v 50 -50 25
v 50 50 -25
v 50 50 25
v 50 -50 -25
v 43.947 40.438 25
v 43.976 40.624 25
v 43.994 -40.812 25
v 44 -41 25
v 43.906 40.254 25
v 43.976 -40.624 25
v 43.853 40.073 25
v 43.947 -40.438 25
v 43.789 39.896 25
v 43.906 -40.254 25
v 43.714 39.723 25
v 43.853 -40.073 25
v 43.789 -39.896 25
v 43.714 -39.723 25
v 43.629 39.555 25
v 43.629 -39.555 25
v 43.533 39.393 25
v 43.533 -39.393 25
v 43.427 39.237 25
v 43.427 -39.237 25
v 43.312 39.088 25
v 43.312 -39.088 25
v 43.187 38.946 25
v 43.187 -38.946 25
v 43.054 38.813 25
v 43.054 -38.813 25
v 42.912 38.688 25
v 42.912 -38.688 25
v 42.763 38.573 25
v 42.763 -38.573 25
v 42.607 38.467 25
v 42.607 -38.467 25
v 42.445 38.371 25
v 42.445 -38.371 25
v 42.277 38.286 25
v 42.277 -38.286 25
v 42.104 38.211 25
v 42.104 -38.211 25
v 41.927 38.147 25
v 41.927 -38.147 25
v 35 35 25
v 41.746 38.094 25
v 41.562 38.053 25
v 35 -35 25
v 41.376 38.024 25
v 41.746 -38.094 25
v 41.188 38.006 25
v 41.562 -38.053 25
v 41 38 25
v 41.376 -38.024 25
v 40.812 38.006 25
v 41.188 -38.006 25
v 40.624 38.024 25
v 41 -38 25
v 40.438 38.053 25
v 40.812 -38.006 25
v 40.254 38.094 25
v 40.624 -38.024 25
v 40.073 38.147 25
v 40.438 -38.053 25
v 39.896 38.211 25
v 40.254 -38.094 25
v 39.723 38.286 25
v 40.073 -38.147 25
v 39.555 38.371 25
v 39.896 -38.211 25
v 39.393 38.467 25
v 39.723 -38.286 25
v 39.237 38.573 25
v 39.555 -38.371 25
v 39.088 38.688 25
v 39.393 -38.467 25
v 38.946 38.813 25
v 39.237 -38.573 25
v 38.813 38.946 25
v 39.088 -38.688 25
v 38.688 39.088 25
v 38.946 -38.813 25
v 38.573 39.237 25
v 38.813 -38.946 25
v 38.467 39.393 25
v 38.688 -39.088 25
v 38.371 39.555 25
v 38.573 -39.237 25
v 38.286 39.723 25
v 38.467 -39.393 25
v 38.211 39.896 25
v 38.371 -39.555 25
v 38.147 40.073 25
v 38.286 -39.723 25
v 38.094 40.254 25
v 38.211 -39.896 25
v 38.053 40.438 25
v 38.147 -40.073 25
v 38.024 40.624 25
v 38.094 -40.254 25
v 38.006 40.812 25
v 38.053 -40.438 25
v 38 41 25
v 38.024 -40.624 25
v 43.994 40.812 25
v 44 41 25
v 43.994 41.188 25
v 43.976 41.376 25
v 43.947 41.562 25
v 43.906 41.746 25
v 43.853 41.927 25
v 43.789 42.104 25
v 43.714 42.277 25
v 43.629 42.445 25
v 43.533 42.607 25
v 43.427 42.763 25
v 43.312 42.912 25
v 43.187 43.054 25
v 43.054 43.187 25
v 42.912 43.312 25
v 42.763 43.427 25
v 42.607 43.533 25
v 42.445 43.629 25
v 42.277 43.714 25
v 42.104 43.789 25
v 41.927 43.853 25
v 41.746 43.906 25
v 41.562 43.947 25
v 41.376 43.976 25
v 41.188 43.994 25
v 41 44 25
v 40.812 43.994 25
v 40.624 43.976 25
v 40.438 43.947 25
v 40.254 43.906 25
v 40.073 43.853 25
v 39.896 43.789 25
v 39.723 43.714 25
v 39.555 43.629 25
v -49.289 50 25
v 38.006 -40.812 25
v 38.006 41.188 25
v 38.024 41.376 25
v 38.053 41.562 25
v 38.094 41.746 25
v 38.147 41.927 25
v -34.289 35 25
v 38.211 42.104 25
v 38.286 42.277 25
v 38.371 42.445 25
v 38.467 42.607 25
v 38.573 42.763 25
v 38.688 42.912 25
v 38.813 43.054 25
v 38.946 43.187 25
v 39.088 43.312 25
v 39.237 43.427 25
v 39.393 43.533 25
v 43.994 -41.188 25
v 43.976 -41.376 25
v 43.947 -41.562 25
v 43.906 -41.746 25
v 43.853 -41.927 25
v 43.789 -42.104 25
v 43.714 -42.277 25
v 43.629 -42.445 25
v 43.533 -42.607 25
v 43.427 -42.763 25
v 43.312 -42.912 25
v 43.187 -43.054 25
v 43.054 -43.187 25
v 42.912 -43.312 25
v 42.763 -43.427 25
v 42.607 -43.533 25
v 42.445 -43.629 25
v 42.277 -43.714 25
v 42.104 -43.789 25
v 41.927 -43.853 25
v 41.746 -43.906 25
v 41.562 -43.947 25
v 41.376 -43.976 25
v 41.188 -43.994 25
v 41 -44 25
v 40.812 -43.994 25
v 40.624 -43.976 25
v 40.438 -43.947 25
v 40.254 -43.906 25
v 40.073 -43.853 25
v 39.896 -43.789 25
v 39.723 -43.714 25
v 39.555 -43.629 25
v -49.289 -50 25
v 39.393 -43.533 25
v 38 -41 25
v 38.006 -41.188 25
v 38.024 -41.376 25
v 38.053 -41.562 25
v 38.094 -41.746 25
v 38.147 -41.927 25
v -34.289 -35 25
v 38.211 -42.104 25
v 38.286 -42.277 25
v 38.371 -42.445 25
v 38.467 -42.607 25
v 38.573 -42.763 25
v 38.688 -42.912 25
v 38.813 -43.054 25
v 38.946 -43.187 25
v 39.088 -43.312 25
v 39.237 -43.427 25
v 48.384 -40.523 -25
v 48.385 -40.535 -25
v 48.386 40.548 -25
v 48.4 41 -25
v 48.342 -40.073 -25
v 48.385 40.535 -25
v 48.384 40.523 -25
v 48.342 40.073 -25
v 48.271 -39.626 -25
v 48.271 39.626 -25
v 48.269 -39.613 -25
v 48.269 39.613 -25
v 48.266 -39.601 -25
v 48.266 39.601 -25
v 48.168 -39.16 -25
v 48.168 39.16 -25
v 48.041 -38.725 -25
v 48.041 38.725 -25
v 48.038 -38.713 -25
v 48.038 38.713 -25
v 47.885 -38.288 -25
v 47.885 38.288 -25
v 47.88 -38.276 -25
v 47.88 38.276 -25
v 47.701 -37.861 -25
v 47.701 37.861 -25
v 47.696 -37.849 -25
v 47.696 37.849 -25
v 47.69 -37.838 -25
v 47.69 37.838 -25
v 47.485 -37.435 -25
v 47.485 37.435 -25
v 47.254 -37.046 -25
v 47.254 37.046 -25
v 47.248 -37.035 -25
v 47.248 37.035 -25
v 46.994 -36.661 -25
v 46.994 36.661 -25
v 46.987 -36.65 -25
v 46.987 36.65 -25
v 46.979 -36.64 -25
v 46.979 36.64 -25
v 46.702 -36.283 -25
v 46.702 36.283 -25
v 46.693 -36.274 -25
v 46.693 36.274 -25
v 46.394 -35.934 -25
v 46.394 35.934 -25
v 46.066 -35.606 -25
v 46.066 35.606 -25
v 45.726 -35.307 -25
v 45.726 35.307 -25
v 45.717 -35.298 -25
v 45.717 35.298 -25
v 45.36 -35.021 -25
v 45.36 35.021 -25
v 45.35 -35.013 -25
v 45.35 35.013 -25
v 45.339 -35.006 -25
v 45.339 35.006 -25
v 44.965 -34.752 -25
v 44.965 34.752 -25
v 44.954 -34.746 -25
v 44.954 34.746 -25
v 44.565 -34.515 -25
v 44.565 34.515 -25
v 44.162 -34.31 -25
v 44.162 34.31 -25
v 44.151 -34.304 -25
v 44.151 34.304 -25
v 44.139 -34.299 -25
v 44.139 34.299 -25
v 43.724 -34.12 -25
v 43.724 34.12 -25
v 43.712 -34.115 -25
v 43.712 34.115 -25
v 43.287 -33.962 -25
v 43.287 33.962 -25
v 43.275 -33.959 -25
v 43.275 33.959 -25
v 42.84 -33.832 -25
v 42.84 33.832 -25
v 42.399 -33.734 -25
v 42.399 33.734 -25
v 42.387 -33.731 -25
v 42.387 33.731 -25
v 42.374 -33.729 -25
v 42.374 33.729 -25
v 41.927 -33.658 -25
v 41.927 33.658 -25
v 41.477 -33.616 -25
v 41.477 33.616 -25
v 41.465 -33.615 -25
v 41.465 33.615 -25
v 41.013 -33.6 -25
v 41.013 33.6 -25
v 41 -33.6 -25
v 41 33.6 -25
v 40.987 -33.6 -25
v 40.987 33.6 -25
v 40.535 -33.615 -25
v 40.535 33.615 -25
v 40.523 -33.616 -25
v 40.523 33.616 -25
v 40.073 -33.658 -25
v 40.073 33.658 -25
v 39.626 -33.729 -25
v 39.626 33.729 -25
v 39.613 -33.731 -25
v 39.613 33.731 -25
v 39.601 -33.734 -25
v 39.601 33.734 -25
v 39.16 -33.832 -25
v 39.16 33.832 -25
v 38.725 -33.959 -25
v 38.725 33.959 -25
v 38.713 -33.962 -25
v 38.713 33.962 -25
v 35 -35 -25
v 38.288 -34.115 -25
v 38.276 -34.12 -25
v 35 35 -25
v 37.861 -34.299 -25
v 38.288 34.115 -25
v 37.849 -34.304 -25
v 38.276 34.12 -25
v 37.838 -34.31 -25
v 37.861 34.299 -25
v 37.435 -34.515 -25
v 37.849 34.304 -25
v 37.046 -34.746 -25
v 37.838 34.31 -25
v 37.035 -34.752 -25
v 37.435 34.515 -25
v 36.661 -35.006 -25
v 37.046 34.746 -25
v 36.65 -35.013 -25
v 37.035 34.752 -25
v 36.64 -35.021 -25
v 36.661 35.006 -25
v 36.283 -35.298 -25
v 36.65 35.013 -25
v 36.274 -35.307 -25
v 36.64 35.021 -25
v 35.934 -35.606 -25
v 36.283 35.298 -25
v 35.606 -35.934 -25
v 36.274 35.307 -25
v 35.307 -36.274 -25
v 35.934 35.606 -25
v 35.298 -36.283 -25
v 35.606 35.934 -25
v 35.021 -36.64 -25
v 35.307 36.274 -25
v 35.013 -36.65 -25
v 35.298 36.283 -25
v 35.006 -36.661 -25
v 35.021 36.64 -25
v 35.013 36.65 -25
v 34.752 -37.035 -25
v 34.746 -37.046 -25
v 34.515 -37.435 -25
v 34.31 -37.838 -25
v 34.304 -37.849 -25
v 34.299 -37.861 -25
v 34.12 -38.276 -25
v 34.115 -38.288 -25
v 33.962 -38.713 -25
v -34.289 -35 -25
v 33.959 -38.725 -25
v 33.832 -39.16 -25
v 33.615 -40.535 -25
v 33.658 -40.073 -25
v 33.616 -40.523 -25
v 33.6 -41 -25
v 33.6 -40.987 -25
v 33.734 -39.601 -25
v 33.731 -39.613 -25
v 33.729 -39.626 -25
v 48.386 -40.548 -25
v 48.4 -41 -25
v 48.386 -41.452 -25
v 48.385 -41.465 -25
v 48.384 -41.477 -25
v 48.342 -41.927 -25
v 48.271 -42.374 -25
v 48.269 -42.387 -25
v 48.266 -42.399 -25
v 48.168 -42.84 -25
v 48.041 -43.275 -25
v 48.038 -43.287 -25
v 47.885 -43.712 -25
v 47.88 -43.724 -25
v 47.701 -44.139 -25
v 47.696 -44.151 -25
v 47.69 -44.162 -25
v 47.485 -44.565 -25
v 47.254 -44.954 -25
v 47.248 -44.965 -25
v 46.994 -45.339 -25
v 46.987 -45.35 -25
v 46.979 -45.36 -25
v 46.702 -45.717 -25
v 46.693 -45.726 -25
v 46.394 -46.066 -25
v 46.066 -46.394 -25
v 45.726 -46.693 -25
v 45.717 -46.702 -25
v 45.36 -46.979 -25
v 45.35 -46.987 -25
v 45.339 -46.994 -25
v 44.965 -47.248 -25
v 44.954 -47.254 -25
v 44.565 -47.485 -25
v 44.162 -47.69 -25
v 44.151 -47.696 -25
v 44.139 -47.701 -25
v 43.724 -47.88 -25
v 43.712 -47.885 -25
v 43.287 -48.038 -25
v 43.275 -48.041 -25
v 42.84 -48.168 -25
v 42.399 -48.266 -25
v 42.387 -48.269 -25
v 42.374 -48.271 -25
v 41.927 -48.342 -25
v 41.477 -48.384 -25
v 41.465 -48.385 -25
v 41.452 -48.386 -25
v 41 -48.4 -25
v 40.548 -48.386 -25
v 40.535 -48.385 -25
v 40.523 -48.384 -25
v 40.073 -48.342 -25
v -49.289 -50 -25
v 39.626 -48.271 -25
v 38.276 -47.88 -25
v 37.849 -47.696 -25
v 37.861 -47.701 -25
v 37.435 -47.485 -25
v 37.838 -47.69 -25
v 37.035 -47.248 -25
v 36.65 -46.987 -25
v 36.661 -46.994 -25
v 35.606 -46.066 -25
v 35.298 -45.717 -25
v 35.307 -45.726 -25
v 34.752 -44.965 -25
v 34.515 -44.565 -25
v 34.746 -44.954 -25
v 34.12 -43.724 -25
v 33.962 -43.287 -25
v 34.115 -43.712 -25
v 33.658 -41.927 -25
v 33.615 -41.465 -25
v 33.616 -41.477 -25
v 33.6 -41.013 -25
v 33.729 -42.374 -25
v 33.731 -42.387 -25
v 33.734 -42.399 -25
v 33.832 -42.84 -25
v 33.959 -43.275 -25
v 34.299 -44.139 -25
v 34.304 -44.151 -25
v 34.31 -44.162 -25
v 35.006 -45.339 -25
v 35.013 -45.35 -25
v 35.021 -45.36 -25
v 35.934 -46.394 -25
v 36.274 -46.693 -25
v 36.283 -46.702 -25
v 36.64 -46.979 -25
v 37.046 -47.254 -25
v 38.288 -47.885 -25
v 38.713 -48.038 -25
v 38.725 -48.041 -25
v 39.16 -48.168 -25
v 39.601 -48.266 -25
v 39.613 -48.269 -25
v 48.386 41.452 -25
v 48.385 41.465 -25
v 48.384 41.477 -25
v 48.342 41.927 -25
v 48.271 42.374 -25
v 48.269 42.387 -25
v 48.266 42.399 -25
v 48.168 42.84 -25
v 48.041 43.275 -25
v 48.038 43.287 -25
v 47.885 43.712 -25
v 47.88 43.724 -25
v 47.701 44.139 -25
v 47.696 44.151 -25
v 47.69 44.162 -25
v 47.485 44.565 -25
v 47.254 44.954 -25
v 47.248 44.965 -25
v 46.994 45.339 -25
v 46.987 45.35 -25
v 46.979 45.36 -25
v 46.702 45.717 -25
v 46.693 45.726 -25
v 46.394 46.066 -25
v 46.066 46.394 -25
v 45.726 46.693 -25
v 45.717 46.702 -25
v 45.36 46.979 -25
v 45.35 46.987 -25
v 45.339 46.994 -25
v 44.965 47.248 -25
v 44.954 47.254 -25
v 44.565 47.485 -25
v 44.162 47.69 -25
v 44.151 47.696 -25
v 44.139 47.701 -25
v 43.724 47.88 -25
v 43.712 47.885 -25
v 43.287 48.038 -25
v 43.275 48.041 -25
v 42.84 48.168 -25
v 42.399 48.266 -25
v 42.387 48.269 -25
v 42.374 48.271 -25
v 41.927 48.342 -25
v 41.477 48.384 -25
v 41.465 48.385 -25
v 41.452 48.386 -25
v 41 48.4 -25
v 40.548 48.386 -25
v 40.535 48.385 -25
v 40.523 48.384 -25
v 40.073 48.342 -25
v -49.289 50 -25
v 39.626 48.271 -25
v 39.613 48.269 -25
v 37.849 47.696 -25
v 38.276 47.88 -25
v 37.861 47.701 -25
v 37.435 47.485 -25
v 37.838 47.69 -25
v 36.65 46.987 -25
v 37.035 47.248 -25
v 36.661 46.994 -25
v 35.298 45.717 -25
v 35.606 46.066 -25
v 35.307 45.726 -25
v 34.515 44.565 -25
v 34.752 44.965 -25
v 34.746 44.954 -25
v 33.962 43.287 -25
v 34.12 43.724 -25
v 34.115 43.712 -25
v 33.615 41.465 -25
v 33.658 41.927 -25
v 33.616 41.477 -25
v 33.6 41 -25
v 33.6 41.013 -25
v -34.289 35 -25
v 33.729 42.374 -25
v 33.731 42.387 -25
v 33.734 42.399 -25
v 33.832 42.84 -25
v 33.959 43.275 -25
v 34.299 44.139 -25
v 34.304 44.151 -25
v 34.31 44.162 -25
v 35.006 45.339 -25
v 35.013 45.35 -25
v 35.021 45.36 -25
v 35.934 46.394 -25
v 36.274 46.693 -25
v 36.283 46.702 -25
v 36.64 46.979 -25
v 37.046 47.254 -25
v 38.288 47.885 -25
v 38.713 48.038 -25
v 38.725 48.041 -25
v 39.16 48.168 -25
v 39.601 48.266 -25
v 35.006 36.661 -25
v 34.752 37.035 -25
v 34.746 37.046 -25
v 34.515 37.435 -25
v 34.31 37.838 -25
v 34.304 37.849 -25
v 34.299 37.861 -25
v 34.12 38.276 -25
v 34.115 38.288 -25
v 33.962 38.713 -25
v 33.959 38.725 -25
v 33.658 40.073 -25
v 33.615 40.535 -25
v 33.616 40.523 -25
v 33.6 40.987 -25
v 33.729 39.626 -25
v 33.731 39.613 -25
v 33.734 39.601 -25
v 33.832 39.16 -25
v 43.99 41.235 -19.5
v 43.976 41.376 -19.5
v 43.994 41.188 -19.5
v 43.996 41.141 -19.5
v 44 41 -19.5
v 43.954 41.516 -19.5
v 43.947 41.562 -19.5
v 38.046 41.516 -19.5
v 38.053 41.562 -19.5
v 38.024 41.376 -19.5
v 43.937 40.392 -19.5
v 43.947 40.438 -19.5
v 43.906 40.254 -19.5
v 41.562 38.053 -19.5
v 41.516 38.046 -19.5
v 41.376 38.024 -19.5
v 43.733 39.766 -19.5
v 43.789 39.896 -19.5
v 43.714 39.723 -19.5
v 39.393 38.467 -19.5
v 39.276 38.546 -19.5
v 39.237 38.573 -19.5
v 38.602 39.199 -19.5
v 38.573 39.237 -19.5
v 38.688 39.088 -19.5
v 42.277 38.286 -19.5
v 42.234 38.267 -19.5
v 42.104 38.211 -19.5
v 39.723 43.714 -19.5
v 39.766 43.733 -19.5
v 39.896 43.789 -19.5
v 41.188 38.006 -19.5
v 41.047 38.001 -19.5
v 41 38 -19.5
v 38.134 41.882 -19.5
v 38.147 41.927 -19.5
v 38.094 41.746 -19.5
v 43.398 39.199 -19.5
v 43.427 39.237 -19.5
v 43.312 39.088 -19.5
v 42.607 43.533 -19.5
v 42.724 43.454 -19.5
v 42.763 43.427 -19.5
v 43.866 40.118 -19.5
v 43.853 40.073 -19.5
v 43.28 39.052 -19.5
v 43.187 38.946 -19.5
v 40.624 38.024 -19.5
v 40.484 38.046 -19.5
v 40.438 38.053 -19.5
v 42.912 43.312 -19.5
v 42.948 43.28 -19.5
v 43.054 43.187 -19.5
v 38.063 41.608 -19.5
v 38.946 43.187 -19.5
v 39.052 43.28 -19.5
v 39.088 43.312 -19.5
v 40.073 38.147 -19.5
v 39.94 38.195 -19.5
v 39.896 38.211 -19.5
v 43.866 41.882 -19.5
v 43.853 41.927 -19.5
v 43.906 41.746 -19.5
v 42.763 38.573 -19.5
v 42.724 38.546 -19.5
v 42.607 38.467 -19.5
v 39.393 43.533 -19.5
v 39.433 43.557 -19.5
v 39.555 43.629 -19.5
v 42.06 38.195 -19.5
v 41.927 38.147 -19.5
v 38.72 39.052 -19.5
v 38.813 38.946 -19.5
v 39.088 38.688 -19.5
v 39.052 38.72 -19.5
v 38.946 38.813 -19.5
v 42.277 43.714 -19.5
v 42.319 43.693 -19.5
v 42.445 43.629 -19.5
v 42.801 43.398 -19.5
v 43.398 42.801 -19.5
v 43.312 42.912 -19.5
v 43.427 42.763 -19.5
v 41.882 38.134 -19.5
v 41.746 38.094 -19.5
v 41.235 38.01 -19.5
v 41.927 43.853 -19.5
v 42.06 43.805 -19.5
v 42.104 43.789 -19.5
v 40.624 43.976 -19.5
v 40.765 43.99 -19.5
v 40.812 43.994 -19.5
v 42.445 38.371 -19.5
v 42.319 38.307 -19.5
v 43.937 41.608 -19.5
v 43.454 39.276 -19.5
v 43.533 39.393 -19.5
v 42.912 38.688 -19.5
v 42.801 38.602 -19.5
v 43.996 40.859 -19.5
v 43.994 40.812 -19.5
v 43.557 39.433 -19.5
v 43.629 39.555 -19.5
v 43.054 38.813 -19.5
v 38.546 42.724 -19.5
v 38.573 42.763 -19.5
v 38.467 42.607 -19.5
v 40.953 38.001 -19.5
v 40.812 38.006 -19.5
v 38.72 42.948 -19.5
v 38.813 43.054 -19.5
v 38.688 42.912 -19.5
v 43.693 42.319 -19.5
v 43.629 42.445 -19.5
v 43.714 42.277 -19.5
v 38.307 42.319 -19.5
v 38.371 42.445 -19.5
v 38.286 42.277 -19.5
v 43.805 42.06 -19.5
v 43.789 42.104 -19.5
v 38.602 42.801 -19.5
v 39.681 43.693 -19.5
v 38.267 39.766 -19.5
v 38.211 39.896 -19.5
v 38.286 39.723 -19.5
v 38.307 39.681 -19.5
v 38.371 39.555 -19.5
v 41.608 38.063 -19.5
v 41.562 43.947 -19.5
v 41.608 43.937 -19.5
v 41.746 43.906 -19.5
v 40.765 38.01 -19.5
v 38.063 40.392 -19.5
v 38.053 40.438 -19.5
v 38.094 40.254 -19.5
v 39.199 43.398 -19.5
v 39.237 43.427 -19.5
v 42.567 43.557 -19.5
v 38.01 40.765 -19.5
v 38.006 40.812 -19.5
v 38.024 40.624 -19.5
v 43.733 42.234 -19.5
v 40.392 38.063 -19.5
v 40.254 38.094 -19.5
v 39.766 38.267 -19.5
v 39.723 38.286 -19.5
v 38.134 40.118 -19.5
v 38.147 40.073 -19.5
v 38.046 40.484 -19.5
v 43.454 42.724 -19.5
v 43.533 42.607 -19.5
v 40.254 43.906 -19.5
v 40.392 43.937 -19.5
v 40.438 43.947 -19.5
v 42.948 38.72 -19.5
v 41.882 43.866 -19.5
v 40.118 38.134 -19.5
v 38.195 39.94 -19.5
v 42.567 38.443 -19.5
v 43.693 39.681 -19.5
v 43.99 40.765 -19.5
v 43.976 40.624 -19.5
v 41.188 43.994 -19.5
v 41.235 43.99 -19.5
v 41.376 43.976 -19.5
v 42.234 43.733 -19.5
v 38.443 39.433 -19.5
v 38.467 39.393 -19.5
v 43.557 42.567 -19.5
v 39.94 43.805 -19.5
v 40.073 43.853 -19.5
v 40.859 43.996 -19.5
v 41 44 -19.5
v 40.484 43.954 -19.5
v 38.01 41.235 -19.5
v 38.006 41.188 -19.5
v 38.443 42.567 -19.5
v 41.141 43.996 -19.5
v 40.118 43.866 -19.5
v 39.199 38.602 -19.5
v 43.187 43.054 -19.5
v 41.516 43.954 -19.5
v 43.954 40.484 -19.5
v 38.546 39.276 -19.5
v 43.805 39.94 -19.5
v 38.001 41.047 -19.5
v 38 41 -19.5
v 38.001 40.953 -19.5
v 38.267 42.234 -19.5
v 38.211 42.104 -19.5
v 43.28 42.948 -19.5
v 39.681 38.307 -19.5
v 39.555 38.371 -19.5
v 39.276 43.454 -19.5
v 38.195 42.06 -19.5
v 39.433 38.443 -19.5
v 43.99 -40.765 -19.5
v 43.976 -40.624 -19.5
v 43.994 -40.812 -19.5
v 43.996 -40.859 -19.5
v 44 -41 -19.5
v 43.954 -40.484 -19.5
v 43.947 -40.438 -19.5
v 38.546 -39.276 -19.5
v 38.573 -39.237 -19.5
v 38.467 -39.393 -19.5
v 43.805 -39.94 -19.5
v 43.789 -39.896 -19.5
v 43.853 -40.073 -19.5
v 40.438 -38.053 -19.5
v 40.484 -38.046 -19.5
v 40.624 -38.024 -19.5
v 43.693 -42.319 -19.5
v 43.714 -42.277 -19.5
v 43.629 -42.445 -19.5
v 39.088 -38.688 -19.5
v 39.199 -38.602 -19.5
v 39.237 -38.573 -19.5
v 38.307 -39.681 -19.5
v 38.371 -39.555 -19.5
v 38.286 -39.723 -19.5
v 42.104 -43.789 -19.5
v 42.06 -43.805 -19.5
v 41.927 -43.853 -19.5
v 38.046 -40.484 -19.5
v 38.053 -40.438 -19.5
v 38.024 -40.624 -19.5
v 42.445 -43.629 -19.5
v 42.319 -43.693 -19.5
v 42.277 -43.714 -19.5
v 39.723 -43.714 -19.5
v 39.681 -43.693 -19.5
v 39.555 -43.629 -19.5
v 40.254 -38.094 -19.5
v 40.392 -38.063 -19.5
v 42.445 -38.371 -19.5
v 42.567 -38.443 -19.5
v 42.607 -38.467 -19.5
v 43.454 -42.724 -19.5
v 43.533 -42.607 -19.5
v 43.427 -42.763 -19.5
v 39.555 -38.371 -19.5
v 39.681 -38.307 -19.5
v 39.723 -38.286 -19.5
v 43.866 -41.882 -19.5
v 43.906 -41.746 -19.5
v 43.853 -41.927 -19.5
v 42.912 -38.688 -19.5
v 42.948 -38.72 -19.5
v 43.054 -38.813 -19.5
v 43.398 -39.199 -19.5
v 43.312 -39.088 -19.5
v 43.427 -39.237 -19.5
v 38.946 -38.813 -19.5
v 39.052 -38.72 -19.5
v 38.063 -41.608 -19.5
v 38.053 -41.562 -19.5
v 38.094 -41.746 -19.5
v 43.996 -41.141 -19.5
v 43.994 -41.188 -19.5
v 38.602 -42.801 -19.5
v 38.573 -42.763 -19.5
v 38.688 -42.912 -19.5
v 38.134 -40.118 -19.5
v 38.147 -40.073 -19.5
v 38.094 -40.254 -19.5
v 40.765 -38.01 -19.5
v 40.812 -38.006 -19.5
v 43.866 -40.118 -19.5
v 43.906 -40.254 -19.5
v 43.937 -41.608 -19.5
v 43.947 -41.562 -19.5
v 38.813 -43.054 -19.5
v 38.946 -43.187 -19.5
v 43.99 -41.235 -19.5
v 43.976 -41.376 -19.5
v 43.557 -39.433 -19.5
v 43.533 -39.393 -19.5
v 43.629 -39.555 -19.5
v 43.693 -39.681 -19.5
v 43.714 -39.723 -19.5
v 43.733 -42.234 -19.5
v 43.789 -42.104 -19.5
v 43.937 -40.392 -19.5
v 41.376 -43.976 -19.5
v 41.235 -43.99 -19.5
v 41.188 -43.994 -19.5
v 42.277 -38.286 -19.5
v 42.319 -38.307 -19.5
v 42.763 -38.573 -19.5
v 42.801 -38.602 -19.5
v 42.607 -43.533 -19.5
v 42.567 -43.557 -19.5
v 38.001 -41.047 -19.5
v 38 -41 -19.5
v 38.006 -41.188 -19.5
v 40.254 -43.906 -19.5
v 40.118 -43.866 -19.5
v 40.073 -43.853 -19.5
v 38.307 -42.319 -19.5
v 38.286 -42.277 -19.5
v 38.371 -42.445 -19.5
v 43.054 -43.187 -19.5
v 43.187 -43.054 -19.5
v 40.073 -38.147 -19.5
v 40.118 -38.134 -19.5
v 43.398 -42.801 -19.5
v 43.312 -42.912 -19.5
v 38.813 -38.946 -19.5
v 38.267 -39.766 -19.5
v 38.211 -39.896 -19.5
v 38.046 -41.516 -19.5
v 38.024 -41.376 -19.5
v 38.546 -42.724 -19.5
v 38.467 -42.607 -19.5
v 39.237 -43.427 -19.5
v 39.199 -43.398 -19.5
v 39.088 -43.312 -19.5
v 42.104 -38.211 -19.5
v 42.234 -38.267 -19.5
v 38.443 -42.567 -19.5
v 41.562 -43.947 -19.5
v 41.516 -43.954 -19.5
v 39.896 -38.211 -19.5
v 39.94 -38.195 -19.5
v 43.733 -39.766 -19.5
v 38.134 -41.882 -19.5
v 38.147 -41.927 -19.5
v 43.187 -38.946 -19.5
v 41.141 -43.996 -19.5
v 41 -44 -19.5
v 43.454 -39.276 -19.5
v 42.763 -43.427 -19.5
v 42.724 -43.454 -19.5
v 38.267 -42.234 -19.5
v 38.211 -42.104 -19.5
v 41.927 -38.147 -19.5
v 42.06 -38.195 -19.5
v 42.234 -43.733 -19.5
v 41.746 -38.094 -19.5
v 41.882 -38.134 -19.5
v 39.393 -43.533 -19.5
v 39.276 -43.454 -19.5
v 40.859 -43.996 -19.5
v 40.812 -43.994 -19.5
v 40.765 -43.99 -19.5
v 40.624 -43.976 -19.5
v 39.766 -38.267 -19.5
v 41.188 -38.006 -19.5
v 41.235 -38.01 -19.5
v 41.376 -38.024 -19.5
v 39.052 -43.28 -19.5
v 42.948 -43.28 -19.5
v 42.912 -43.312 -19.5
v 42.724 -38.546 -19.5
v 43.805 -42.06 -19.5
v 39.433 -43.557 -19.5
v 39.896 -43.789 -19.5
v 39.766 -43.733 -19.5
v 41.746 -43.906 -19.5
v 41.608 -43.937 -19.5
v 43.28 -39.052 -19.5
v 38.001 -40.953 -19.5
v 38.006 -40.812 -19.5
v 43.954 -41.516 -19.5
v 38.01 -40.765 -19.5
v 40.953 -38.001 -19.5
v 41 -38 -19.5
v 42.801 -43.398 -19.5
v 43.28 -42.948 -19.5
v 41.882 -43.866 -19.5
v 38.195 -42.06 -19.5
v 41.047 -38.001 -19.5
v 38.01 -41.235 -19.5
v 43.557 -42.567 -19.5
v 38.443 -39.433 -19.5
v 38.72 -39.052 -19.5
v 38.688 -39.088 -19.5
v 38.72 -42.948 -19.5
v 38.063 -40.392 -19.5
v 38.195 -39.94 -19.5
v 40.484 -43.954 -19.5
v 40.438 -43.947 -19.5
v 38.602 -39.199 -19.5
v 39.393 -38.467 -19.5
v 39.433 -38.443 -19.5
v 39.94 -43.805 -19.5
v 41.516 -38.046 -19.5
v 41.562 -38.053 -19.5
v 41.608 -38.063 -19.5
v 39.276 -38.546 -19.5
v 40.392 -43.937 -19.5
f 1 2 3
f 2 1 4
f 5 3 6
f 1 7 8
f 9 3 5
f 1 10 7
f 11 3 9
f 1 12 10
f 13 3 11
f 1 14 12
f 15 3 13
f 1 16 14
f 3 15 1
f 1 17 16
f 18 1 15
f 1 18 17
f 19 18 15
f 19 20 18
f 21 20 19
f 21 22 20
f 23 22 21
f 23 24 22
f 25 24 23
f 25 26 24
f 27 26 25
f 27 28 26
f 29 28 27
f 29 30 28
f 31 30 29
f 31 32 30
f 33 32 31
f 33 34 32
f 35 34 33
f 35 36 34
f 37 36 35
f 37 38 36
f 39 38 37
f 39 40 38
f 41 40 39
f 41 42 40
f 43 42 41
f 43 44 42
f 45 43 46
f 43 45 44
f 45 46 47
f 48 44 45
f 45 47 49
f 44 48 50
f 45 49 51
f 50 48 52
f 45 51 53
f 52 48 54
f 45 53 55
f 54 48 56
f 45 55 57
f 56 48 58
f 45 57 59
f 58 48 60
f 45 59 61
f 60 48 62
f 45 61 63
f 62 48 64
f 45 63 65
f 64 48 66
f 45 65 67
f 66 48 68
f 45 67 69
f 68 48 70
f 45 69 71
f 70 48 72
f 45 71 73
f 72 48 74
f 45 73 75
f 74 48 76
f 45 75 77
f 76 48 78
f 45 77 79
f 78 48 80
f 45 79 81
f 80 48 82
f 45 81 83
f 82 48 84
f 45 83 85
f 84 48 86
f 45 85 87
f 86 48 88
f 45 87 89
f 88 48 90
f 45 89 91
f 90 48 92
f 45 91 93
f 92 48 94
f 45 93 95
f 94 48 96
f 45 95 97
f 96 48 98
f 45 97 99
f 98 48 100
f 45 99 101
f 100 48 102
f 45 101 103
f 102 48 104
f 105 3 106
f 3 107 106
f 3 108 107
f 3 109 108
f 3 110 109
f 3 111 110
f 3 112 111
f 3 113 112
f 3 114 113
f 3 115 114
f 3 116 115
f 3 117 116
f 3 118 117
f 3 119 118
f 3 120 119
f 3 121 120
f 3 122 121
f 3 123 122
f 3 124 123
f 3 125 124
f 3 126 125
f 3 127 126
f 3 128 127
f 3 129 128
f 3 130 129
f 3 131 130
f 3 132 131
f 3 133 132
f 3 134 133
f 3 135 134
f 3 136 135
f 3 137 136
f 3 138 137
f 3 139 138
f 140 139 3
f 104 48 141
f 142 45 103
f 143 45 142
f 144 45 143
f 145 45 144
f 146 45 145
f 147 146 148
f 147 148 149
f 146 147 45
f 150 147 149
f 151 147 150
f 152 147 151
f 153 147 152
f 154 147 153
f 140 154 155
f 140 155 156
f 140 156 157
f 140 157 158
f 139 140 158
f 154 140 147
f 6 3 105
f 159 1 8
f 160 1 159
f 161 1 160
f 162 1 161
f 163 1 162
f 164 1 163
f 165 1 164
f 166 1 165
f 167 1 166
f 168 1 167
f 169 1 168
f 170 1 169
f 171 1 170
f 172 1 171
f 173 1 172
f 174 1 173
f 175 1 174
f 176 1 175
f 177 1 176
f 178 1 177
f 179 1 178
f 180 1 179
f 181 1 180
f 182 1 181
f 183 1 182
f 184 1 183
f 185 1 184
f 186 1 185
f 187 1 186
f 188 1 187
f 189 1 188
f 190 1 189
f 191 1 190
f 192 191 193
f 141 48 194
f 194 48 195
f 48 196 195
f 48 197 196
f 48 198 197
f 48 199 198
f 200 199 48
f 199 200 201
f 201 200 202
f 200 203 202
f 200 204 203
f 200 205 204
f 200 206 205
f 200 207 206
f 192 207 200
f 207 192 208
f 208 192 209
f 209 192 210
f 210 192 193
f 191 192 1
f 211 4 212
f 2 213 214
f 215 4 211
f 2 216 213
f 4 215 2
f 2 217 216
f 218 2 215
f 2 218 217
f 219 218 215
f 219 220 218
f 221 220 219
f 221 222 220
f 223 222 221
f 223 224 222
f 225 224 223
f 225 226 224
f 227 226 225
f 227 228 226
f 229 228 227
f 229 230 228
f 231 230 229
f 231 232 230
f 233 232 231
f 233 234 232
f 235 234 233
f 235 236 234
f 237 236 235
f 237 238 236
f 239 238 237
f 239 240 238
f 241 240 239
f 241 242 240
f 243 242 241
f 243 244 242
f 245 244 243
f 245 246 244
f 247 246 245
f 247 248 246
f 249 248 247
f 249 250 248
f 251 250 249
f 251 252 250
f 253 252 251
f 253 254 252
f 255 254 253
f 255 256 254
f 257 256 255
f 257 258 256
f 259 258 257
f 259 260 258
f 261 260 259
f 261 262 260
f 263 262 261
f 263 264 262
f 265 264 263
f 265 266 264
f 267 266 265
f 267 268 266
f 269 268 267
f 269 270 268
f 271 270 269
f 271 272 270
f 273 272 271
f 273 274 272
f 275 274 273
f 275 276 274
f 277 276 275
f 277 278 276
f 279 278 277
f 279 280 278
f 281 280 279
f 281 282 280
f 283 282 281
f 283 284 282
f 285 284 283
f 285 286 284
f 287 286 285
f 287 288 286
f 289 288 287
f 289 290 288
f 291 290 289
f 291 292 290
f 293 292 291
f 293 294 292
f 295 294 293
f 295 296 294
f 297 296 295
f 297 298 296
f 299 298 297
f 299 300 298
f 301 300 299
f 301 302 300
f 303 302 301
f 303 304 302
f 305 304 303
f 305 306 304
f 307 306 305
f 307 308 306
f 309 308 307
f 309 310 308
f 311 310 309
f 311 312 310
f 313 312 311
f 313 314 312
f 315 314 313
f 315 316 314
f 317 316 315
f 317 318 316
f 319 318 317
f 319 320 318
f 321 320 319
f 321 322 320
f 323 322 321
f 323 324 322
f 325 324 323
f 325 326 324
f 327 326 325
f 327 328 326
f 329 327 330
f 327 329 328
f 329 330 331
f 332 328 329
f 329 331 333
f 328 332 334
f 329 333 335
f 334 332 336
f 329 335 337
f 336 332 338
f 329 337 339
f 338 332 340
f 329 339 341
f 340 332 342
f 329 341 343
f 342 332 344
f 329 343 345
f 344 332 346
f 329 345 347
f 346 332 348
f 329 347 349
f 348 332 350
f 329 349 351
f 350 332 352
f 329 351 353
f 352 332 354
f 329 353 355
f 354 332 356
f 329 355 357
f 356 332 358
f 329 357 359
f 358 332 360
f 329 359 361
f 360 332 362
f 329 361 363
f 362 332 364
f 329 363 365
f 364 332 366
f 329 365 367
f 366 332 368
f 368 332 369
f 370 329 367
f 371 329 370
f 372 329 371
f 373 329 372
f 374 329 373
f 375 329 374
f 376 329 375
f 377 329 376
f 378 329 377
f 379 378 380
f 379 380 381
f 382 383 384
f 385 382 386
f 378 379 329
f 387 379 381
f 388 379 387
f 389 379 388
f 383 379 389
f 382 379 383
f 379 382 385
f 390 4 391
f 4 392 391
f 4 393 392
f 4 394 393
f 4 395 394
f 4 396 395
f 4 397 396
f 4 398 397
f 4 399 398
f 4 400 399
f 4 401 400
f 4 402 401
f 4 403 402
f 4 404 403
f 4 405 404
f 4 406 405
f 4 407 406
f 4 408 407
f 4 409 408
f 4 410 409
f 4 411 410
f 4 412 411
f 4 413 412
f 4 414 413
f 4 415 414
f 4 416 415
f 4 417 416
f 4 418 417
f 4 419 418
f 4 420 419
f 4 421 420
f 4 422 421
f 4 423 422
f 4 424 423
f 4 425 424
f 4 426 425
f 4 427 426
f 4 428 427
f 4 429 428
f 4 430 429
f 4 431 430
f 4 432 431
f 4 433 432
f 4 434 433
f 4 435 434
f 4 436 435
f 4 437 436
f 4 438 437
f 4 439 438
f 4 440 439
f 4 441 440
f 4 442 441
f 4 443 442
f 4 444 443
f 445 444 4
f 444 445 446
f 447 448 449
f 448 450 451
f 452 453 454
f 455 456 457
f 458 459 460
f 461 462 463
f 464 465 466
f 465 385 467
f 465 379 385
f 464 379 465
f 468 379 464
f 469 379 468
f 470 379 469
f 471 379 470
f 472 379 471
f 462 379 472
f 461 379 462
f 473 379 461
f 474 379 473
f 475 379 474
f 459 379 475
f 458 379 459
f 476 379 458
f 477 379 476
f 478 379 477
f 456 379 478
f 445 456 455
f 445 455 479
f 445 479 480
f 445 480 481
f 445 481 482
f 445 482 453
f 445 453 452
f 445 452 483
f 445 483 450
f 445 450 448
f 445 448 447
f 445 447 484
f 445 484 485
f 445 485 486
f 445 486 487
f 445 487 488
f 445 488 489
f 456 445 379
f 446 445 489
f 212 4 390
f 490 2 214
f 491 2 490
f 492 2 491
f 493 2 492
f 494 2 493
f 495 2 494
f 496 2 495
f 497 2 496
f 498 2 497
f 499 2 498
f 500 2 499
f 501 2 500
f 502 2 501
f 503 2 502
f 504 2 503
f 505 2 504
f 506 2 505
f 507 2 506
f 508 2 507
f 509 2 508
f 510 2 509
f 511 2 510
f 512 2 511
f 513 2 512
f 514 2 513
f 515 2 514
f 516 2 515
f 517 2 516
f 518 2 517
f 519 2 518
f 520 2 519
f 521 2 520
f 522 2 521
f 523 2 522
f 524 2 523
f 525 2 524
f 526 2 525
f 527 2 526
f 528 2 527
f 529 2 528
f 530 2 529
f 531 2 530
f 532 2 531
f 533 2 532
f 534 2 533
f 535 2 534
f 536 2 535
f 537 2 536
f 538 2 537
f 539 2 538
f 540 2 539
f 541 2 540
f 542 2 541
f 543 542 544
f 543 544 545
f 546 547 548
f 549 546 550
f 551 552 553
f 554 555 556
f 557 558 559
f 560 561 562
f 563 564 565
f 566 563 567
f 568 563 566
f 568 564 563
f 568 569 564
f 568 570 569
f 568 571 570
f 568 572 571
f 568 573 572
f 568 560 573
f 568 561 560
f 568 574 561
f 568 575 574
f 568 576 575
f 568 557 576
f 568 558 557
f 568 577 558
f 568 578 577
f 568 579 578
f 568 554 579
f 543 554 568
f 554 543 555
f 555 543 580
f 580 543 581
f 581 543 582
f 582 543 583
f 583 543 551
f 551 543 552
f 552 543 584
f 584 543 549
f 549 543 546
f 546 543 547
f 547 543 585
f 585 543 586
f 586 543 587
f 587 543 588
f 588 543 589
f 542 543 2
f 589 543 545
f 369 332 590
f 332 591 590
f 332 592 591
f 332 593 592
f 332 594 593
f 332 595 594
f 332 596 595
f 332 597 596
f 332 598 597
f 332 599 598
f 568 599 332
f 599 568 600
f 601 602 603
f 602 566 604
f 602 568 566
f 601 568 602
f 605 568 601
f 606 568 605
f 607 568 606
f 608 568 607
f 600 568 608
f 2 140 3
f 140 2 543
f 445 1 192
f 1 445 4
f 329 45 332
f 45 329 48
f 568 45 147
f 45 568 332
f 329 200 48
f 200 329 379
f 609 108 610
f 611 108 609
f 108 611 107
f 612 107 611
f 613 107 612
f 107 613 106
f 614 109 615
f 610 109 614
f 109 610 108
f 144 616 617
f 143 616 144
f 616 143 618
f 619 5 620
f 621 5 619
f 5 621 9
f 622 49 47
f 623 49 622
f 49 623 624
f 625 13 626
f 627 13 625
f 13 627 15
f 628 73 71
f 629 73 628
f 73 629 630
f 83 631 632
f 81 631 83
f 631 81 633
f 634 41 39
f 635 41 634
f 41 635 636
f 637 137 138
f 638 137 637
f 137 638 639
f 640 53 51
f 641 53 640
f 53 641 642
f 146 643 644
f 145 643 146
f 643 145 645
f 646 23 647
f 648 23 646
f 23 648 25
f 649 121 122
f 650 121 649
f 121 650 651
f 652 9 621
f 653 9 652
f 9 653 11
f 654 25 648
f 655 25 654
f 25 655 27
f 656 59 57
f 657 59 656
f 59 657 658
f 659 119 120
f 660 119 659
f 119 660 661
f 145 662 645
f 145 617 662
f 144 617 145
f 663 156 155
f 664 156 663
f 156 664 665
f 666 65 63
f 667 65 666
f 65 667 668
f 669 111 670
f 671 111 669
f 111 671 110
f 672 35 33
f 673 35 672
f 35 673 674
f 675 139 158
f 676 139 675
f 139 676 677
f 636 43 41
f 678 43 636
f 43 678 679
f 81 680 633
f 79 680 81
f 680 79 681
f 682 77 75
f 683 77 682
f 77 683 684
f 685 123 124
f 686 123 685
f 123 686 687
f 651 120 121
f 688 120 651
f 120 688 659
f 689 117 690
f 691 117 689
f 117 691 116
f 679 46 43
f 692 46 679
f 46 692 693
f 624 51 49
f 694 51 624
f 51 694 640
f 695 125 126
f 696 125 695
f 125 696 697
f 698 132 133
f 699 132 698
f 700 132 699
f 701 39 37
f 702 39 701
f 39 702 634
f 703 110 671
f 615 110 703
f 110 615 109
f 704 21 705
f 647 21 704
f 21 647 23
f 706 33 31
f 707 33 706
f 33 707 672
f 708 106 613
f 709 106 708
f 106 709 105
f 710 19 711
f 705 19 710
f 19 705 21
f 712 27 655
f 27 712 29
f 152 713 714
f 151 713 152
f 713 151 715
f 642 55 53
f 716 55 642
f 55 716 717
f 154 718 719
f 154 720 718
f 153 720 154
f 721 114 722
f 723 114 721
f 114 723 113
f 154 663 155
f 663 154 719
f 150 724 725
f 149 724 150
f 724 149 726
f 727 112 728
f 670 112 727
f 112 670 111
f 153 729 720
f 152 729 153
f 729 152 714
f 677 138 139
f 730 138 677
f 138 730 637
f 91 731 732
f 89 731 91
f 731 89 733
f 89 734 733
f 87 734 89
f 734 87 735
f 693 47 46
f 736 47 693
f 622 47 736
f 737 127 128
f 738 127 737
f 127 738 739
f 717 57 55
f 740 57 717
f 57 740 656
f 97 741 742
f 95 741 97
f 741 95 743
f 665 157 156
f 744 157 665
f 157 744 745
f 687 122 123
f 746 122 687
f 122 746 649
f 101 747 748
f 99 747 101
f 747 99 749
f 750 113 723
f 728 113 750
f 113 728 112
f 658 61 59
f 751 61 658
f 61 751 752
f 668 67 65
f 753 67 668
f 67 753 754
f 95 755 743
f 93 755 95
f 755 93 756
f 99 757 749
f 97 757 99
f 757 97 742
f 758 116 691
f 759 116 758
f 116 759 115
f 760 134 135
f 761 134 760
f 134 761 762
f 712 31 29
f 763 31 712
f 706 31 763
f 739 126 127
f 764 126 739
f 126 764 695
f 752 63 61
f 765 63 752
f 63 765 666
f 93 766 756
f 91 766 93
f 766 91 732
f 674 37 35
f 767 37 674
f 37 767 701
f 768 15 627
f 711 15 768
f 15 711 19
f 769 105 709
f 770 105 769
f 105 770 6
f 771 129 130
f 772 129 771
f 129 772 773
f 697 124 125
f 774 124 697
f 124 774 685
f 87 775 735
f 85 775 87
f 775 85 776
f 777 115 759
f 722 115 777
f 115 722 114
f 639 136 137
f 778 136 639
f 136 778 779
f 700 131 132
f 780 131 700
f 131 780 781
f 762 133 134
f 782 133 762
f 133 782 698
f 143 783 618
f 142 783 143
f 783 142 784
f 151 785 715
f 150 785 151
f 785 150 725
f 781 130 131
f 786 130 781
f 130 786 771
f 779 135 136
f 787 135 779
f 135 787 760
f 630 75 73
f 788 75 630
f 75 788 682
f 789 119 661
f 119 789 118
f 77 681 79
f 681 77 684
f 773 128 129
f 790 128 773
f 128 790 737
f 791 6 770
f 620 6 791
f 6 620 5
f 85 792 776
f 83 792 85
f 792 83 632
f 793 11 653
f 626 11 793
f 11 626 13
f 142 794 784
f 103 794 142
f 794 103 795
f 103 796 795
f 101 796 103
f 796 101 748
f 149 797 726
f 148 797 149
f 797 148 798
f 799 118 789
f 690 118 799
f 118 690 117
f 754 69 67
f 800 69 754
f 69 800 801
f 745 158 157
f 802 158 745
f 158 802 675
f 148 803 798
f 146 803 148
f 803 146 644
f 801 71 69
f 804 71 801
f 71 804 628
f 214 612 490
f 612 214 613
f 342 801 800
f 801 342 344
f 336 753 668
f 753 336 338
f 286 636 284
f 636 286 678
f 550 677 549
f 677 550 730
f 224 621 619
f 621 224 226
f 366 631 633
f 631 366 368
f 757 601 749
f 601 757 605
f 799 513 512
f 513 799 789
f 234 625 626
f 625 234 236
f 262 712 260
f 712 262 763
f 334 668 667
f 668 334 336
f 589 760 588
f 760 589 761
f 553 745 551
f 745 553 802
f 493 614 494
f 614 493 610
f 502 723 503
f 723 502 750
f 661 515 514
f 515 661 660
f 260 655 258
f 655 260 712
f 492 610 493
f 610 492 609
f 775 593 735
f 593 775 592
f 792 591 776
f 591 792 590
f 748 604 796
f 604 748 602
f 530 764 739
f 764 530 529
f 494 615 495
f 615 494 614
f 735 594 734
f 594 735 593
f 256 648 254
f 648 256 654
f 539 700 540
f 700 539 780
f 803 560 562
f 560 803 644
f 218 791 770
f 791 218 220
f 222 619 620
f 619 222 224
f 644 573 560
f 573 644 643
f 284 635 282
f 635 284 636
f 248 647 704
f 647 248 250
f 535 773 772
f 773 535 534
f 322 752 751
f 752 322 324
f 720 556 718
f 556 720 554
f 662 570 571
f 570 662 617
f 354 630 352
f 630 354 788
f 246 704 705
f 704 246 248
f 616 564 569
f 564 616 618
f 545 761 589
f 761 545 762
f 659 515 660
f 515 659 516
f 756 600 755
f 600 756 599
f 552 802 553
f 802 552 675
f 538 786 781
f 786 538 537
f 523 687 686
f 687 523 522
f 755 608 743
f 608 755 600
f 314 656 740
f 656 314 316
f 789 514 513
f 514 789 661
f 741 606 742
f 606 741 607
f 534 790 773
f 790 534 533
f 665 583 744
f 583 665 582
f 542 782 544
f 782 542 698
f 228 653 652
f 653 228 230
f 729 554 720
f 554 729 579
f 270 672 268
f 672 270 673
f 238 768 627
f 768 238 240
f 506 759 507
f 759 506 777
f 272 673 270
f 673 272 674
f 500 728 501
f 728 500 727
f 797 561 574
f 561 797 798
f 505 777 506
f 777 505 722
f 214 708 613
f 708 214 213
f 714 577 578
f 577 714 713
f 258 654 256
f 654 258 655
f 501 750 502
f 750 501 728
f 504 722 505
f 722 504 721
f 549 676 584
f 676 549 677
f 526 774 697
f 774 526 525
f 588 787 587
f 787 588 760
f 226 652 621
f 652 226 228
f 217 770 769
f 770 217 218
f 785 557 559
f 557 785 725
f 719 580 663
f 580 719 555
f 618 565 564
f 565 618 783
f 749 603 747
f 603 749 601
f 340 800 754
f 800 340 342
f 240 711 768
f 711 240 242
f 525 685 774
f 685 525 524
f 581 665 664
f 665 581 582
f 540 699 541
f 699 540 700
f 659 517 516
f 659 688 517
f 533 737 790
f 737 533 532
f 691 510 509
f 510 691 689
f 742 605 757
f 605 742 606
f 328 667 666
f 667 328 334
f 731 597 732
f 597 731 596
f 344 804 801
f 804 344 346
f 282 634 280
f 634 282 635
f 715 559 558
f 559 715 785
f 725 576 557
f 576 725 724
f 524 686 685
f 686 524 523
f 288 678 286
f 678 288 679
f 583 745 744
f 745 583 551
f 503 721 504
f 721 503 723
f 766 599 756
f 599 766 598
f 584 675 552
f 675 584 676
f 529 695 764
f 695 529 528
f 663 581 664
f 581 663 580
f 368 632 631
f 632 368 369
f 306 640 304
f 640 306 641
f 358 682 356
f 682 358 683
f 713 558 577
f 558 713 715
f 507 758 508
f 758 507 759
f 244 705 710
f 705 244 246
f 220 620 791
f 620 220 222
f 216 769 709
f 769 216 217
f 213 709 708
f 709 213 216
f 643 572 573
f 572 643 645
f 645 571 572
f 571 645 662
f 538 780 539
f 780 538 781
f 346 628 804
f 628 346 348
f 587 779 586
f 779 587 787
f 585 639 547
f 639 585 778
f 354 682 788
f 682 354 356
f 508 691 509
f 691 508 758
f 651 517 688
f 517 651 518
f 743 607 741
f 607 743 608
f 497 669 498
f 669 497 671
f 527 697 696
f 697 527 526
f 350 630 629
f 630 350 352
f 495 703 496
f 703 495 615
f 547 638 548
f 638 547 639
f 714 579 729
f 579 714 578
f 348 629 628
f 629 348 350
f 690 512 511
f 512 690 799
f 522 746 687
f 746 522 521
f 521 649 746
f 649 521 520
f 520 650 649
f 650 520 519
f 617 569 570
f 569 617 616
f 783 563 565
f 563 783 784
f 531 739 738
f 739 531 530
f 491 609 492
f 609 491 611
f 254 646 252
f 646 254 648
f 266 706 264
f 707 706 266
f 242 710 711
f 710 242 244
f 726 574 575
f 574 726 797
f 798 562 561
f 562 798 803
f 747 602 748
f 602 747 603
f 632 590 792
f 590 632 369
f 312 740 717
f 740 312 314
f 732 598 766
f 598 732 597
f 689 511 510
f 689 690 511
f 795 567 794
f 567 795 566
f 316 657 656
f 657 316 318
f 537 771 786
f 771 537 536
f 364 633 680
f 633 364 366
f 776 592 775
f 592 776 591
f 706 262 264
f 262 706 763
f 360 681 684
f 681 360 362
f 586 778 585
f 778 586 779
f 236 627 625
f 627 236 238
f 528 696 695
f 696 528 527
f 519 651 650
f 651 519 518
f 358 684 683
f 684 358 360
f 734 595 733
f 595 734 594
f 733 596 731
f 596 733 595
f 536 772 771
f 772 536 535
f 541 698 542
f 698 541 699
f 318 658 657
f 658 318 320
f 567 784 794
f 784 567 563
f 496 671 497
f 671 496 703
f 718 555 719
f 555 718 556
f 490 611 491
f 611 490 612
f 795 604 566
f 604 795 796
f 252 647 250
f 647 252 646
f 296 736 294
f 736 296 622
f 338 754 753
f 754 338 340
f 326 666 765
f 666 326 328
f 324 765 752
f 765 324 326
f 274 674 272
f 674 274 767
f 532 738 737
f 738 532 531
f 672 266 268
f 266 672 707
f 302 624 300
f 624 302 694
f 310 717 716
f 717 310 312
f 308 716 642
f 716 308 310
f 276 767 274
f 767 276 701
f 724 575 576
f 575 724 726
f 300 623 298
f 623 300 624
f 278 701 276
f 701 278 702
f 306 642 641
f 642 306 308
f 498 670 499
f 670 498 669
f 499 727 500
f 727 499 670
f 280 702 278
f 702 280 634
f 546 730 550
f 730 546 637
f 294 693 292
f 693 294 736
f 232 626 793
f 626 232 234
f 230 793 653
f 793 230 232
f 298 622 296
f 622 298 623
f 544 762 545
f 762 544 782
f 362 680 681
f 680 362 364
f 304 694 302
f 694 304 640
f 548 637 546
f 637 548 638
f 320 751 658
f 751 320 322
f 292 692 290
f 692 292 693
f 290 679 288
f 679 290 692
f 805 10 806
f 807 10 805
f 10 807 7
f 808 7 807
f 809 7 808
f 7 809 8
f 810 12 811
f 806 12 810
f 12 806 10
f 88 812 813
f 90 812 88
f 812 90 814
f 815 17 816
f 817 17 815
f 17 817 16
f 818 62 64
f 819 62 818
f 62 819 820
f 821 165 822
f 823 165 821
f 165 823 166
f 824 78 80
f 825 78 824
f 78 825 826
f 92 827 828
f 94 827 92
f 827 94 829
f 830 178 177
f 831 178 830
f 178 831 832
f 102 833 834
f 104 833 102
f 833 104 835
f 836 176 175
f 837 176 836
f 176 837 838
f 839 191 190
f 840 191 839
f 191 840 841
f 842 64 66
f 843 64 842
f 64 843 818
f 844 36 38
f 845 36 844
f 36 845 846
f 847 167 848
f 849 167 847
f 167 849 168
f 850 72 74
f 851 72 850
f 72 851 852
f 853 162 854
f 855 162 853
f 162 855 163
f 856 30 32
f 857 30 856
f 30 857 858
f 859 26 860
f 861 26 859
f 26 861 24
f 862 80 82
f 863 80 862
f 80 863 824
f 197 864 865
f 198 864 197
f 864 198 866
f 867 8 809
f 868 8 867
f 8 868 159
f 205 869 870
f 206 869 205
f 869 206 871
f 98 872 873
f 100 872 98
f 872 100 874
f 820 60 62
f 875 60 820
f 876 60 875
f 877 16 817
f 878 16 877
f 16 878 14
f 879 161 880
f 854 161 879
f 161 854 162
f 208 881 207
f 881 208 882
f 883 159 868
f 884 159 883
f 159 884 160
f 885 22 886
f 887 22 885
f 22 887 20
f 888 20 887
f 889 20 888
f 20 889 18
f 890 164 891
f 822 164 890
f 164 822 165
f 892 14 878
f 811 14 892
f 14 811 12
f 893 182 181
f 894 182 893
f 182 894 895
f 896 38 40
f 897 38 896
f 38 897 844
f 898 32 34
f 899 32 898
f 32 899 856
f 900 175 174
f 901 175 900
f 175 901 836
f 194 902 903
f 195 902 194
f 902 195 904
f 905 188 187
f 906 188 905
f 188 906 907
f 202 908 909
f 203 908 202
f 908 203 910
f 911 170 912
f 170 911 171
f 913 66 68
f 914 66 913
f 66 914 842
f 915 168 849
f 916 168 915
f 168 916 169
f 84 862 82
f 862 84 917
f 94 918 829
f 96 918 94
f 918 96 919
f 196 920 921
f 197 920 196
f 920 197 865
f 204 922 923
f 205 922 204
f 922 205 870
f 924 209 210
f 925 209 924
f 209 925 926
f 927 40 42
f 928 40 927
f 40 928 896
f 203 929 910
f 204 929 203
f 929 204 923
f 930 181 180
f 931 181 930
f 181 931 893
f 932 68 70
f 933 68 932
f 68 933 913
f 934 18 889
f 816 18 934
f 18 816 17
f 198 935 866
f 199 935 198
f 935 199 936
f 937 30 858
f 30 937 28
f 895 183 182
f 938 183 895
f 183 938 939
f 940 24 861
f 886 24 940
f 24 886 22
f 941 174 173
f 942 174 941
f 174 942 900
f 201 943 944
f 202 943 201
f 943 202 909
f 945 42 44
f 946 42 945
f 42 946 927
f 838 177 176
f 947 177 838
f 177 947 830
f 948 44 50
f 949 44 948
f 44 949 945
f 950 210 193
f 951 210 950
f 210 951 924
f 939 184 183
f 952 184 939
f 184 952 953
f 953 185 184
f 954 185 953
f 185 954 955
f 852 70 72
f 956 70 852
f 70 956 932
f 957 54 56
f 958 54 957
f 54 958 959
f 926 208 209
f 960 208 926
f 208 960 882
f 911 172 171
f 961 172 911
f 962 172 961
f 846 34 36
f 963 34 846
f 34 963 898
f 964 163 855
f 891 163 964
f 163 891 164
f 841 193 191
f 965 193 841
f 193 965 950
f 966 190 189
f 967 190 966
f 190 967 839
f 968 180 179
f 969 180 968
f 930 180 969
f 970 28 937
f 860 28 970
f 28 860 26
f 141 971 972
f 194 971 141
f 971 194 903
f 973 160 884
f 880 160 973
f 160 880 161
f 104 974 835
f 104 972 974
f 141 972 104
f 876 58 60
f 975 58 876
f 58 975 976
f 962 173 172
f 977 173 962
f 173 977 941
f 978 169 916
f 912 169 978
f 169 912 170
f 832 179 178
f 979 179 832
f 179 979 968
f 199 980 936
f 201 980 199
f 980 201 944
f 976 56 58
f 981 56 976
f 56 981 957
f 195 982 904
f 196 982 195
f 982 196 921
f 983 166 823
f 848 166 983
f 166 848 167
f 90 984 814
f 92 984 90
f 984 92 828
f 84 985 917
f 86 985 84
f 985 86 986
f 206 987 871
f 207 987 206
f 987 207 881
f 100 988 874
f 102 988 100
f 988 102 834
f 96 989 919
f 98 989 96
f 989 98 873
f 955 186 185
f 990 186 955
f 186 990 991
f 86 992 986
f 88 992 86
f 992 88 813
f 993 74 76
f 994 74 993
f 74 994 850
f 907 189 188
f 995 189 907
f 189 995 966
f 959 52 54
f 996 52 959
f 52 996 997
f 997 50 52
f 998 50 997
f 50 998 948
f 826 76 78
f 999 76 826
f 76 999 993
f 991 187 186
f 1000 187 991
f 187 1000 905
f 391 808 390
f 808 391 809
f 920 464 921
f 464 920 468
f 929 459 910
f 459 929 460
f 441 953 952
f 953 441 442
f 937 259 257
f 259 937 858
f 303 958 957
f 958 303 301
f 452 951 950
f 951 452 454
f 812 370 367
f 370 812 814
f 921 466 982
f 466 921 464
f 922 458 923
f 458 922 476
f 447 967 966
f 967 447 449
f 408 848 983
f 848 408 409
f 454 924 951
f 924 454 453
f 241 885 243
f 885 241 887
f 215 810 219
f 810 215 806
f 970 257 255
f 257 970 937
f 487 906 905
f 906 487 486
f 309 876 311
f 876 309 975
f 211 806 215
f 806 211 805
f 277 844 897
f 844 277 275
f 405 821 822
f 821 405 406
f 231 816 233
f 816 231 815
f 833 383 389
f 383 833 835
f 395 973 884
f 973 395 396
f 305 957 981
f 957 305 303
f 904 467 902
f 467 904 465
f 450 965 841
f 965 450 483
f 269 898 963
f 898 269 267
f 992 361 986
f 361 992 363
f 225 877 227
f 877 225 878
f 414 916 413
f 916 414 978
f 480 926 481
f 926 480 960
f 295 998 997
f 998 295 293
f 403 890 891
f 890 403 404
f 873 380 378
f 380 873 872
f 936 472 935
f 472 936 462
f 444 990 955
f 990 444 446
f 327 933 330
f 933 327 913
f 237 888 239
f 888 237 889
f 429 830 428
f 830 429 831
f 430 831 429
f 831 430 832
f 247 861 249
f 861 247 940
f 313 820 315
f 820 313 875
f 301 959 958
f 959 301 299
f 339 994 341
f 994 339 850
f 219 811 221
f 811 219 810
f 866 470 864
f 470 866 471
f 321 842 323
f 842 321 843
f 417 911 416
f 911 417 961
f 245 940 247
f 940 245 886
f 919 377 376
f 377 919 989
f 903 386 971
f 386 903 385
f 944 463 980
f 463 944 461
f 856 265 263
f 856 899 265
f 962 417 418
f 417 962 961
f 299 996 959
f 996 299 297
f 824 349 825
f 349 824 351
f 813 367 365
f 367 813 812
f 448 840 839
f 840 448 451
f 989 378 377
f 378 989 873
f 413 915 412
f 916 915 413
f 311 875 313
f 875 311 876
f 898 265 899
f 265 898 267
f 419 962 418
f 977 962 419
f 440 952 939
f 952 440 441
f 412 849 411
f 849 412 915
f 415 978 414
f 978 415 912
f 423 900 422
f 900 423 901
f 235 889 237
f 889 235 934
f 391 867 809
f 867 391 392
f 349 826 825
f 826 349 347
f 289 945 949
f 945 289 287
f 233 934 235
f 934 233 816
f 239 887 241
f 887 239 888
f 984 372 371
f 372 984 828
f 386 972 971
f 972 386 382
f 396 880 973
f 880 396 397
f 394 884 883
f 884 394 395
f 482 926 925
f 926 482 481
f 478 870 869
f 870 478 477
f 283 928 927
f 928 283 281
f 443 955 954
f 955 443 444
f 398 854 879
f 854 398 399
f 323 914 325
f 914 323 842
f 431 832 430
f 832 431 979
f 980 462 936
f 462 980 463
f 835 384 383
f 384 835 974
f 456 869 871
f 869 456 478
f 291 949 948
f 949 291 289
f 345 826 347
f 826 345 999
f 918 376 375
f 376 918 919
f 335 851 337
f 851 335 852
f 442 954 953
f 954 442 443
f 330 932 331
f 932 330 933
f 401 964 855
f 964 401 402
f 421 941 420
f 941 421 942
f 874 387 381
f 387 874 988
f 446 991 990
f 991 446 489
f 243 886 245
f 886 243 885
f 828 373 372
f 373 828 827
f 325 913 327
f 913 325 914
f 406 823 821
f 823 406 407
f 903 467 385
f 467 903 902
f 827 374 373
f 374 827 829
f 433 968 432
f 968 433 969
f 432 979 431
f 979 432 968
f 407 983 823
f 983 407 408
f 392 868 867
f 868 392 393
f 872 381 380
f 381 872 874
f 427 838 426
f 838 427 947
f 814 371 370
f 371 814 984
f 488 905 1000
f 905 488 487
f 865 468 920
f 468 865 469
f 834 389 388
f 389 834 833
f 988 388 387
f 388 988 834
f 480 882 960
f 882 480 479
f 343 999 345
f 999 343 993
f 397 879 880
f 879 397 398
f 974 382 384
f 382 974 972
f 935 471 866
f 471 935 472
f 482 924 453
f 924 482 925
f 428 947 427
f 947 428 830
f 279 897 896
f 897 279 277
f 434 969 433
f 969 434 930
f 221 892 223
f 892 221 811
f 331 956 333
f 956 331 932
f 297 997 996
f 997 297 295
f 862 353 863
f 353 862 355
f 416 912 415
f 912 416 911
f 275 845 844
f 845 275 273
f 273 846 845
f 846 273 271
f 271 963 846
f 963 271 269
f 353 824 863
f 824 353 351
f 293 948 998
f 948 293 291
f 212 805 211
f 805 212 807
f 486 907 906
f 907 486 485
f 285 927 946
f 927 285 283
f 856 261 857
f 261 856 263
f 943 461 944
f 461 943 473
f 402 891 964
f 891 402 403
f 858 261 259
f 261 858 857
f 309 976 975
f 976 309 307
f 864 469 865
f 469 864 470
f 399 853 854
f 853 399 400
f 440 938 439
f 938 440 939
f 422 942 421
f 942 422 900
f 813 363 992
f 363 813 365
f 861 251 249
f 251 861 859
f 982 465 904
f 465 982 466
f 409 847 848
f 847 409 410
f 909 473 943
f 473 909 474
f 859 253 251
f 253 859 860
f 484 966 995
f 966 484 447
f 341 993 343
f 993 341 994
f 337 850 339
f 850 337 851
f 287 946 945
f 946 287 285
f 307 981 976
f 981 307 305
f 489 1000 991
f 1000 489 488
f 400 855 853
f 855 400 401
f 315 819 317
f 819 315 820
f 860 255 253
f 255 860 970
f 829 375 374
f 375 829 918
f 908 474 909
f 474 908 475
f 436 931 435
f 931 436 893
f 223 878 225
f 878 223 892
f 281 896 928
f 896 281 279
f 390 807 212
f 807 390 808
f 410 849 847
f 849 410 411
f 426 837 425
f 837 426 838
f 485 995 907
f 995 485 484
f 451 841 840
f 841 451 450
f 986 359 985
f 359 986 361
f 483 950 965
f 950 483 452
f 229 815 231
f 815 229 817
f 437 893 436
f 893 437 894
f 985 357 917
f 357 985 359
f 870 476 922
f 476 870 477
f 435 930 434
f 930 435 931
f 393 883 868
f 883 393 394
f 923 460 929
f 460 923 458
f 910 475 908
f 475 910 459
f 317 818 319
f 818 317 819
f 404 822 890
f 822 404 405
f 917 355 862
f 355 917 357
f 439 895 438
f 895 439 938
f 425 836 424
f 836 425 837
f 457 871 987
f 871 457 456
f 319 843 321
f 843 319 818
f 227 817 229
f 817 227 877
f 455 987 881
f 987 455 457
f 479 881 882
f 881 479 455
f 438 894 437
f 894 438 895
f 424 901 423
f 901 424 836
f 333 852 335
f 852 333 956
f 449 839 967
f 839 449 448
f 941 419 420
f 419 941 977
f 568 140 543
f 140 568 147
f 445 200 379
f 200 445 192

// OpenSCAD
pumpside = 70;
holderside = 100;
screwdiameter = 3;
holeXtranslate = 0.5*pumpside + (holderside-pumpside) / 2 - screwdiameter*3;
difference(){
    cube(center=true, [holderside,holderside,50]);
    cube(center=true, [pumpside,pumpside,60]);
    translate([holeXtranslate,holeXtranslate,0])cylinder(r=screwdiameter, h=100, $fn=100, center=true);
    translate([holeXtranslate,holeXtranslate,-22])cylinder(r1=screwdiameter*3, r2=1, h=10, $fn=100, center=true); //senklocch

    translate([holeXtranslate,-holeXtranslate,0])cylinder(r=screwdiameter, h=100, $fn=100, center=true);
    translate([holeXtranslate,-holeXtranslate,-22])cylinder(r1=screwdiameter*3, r2=1, h=10, $fn=100, center=true); //senklocch
    translate([-pumpside,0,0])rotate([0,0,45])cube(center=true, [holderside,holderside,60]);
}
